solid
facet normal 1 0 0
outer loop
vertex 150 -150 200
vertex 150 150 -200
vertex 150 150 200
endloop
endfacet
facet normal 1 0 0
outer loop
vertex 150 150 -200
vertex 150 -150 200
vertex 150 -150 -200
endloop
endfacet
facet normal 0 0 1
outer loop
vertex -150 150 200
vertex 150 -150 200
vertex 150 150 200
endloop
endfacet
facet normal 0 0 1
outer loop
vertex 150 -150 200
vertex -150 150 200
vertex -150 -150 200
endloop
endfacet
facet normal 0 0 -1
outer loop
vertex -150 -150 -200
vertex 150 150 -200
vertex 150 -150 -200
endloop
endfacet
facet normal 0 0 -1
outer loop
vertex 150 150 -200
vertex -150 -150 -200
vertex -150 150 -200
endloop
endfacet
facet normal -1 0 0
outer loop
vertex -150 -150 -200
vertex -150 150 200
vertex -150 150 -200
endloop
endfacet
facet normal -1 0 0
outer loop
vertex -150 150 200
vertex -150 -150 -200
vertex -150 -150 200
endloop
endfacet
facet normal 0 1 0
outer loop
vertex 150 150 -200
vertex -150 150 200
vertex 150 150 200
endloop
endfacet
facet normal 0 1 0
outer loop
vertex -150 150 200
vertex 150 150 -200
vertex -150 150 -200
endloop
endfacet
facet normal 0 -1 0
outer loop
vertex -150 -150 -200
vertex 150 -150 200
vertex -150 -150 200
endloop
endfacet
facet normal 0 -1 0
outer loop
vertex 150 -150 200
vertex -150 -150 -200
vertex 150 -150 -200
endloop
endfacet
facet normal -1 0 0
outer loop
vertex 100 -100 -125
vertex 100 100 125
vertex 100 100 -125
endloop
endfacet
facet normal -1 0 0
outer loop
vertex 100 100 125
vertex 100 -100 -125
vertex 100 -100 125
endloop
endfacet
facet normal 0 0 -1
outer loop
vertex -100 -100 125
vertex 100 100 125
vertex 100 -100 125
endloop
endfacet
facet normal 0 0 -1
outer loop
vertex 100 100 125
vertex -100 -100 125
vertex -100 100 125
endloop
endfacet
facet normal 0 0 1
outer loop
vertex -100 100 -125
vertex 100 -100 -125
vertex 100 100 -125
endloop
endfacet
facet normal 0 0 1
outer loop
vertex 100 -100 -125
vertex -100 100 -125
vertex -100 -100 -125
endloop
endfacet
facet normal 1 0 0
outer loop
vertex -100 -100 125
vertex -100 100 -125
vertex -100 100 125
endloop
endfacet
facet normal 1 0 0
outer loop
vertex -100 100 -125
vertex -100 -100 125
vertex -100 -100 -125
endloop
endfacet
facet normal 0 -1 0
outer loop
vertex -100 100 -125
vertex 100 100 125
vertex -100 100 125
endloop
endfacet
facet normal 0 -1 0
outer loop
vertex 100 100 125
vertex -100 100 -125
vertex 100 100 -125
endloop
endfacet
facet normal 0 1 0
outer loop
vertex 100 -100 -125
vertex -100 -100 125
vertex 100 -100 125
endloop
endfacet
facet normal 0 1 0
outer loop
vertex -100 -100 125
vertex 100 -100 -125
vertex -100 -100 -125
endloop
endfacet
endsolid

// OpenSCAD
// Generated by ZEO-Architect
// Project: The_Bio_Alchemist_Printer
$fn=100;

difference() {
  union() {
    cube([300, 300, 400], center=true);
    sphere(r=120);
  }
  cube([200, 200, 250], center=true);
  union() {
    cylinder(r=20, h=100, center=true);
    cylinder(r=20, h=100, center=true);
    cylinder(r=20, h=100, center=true);
  }
}
